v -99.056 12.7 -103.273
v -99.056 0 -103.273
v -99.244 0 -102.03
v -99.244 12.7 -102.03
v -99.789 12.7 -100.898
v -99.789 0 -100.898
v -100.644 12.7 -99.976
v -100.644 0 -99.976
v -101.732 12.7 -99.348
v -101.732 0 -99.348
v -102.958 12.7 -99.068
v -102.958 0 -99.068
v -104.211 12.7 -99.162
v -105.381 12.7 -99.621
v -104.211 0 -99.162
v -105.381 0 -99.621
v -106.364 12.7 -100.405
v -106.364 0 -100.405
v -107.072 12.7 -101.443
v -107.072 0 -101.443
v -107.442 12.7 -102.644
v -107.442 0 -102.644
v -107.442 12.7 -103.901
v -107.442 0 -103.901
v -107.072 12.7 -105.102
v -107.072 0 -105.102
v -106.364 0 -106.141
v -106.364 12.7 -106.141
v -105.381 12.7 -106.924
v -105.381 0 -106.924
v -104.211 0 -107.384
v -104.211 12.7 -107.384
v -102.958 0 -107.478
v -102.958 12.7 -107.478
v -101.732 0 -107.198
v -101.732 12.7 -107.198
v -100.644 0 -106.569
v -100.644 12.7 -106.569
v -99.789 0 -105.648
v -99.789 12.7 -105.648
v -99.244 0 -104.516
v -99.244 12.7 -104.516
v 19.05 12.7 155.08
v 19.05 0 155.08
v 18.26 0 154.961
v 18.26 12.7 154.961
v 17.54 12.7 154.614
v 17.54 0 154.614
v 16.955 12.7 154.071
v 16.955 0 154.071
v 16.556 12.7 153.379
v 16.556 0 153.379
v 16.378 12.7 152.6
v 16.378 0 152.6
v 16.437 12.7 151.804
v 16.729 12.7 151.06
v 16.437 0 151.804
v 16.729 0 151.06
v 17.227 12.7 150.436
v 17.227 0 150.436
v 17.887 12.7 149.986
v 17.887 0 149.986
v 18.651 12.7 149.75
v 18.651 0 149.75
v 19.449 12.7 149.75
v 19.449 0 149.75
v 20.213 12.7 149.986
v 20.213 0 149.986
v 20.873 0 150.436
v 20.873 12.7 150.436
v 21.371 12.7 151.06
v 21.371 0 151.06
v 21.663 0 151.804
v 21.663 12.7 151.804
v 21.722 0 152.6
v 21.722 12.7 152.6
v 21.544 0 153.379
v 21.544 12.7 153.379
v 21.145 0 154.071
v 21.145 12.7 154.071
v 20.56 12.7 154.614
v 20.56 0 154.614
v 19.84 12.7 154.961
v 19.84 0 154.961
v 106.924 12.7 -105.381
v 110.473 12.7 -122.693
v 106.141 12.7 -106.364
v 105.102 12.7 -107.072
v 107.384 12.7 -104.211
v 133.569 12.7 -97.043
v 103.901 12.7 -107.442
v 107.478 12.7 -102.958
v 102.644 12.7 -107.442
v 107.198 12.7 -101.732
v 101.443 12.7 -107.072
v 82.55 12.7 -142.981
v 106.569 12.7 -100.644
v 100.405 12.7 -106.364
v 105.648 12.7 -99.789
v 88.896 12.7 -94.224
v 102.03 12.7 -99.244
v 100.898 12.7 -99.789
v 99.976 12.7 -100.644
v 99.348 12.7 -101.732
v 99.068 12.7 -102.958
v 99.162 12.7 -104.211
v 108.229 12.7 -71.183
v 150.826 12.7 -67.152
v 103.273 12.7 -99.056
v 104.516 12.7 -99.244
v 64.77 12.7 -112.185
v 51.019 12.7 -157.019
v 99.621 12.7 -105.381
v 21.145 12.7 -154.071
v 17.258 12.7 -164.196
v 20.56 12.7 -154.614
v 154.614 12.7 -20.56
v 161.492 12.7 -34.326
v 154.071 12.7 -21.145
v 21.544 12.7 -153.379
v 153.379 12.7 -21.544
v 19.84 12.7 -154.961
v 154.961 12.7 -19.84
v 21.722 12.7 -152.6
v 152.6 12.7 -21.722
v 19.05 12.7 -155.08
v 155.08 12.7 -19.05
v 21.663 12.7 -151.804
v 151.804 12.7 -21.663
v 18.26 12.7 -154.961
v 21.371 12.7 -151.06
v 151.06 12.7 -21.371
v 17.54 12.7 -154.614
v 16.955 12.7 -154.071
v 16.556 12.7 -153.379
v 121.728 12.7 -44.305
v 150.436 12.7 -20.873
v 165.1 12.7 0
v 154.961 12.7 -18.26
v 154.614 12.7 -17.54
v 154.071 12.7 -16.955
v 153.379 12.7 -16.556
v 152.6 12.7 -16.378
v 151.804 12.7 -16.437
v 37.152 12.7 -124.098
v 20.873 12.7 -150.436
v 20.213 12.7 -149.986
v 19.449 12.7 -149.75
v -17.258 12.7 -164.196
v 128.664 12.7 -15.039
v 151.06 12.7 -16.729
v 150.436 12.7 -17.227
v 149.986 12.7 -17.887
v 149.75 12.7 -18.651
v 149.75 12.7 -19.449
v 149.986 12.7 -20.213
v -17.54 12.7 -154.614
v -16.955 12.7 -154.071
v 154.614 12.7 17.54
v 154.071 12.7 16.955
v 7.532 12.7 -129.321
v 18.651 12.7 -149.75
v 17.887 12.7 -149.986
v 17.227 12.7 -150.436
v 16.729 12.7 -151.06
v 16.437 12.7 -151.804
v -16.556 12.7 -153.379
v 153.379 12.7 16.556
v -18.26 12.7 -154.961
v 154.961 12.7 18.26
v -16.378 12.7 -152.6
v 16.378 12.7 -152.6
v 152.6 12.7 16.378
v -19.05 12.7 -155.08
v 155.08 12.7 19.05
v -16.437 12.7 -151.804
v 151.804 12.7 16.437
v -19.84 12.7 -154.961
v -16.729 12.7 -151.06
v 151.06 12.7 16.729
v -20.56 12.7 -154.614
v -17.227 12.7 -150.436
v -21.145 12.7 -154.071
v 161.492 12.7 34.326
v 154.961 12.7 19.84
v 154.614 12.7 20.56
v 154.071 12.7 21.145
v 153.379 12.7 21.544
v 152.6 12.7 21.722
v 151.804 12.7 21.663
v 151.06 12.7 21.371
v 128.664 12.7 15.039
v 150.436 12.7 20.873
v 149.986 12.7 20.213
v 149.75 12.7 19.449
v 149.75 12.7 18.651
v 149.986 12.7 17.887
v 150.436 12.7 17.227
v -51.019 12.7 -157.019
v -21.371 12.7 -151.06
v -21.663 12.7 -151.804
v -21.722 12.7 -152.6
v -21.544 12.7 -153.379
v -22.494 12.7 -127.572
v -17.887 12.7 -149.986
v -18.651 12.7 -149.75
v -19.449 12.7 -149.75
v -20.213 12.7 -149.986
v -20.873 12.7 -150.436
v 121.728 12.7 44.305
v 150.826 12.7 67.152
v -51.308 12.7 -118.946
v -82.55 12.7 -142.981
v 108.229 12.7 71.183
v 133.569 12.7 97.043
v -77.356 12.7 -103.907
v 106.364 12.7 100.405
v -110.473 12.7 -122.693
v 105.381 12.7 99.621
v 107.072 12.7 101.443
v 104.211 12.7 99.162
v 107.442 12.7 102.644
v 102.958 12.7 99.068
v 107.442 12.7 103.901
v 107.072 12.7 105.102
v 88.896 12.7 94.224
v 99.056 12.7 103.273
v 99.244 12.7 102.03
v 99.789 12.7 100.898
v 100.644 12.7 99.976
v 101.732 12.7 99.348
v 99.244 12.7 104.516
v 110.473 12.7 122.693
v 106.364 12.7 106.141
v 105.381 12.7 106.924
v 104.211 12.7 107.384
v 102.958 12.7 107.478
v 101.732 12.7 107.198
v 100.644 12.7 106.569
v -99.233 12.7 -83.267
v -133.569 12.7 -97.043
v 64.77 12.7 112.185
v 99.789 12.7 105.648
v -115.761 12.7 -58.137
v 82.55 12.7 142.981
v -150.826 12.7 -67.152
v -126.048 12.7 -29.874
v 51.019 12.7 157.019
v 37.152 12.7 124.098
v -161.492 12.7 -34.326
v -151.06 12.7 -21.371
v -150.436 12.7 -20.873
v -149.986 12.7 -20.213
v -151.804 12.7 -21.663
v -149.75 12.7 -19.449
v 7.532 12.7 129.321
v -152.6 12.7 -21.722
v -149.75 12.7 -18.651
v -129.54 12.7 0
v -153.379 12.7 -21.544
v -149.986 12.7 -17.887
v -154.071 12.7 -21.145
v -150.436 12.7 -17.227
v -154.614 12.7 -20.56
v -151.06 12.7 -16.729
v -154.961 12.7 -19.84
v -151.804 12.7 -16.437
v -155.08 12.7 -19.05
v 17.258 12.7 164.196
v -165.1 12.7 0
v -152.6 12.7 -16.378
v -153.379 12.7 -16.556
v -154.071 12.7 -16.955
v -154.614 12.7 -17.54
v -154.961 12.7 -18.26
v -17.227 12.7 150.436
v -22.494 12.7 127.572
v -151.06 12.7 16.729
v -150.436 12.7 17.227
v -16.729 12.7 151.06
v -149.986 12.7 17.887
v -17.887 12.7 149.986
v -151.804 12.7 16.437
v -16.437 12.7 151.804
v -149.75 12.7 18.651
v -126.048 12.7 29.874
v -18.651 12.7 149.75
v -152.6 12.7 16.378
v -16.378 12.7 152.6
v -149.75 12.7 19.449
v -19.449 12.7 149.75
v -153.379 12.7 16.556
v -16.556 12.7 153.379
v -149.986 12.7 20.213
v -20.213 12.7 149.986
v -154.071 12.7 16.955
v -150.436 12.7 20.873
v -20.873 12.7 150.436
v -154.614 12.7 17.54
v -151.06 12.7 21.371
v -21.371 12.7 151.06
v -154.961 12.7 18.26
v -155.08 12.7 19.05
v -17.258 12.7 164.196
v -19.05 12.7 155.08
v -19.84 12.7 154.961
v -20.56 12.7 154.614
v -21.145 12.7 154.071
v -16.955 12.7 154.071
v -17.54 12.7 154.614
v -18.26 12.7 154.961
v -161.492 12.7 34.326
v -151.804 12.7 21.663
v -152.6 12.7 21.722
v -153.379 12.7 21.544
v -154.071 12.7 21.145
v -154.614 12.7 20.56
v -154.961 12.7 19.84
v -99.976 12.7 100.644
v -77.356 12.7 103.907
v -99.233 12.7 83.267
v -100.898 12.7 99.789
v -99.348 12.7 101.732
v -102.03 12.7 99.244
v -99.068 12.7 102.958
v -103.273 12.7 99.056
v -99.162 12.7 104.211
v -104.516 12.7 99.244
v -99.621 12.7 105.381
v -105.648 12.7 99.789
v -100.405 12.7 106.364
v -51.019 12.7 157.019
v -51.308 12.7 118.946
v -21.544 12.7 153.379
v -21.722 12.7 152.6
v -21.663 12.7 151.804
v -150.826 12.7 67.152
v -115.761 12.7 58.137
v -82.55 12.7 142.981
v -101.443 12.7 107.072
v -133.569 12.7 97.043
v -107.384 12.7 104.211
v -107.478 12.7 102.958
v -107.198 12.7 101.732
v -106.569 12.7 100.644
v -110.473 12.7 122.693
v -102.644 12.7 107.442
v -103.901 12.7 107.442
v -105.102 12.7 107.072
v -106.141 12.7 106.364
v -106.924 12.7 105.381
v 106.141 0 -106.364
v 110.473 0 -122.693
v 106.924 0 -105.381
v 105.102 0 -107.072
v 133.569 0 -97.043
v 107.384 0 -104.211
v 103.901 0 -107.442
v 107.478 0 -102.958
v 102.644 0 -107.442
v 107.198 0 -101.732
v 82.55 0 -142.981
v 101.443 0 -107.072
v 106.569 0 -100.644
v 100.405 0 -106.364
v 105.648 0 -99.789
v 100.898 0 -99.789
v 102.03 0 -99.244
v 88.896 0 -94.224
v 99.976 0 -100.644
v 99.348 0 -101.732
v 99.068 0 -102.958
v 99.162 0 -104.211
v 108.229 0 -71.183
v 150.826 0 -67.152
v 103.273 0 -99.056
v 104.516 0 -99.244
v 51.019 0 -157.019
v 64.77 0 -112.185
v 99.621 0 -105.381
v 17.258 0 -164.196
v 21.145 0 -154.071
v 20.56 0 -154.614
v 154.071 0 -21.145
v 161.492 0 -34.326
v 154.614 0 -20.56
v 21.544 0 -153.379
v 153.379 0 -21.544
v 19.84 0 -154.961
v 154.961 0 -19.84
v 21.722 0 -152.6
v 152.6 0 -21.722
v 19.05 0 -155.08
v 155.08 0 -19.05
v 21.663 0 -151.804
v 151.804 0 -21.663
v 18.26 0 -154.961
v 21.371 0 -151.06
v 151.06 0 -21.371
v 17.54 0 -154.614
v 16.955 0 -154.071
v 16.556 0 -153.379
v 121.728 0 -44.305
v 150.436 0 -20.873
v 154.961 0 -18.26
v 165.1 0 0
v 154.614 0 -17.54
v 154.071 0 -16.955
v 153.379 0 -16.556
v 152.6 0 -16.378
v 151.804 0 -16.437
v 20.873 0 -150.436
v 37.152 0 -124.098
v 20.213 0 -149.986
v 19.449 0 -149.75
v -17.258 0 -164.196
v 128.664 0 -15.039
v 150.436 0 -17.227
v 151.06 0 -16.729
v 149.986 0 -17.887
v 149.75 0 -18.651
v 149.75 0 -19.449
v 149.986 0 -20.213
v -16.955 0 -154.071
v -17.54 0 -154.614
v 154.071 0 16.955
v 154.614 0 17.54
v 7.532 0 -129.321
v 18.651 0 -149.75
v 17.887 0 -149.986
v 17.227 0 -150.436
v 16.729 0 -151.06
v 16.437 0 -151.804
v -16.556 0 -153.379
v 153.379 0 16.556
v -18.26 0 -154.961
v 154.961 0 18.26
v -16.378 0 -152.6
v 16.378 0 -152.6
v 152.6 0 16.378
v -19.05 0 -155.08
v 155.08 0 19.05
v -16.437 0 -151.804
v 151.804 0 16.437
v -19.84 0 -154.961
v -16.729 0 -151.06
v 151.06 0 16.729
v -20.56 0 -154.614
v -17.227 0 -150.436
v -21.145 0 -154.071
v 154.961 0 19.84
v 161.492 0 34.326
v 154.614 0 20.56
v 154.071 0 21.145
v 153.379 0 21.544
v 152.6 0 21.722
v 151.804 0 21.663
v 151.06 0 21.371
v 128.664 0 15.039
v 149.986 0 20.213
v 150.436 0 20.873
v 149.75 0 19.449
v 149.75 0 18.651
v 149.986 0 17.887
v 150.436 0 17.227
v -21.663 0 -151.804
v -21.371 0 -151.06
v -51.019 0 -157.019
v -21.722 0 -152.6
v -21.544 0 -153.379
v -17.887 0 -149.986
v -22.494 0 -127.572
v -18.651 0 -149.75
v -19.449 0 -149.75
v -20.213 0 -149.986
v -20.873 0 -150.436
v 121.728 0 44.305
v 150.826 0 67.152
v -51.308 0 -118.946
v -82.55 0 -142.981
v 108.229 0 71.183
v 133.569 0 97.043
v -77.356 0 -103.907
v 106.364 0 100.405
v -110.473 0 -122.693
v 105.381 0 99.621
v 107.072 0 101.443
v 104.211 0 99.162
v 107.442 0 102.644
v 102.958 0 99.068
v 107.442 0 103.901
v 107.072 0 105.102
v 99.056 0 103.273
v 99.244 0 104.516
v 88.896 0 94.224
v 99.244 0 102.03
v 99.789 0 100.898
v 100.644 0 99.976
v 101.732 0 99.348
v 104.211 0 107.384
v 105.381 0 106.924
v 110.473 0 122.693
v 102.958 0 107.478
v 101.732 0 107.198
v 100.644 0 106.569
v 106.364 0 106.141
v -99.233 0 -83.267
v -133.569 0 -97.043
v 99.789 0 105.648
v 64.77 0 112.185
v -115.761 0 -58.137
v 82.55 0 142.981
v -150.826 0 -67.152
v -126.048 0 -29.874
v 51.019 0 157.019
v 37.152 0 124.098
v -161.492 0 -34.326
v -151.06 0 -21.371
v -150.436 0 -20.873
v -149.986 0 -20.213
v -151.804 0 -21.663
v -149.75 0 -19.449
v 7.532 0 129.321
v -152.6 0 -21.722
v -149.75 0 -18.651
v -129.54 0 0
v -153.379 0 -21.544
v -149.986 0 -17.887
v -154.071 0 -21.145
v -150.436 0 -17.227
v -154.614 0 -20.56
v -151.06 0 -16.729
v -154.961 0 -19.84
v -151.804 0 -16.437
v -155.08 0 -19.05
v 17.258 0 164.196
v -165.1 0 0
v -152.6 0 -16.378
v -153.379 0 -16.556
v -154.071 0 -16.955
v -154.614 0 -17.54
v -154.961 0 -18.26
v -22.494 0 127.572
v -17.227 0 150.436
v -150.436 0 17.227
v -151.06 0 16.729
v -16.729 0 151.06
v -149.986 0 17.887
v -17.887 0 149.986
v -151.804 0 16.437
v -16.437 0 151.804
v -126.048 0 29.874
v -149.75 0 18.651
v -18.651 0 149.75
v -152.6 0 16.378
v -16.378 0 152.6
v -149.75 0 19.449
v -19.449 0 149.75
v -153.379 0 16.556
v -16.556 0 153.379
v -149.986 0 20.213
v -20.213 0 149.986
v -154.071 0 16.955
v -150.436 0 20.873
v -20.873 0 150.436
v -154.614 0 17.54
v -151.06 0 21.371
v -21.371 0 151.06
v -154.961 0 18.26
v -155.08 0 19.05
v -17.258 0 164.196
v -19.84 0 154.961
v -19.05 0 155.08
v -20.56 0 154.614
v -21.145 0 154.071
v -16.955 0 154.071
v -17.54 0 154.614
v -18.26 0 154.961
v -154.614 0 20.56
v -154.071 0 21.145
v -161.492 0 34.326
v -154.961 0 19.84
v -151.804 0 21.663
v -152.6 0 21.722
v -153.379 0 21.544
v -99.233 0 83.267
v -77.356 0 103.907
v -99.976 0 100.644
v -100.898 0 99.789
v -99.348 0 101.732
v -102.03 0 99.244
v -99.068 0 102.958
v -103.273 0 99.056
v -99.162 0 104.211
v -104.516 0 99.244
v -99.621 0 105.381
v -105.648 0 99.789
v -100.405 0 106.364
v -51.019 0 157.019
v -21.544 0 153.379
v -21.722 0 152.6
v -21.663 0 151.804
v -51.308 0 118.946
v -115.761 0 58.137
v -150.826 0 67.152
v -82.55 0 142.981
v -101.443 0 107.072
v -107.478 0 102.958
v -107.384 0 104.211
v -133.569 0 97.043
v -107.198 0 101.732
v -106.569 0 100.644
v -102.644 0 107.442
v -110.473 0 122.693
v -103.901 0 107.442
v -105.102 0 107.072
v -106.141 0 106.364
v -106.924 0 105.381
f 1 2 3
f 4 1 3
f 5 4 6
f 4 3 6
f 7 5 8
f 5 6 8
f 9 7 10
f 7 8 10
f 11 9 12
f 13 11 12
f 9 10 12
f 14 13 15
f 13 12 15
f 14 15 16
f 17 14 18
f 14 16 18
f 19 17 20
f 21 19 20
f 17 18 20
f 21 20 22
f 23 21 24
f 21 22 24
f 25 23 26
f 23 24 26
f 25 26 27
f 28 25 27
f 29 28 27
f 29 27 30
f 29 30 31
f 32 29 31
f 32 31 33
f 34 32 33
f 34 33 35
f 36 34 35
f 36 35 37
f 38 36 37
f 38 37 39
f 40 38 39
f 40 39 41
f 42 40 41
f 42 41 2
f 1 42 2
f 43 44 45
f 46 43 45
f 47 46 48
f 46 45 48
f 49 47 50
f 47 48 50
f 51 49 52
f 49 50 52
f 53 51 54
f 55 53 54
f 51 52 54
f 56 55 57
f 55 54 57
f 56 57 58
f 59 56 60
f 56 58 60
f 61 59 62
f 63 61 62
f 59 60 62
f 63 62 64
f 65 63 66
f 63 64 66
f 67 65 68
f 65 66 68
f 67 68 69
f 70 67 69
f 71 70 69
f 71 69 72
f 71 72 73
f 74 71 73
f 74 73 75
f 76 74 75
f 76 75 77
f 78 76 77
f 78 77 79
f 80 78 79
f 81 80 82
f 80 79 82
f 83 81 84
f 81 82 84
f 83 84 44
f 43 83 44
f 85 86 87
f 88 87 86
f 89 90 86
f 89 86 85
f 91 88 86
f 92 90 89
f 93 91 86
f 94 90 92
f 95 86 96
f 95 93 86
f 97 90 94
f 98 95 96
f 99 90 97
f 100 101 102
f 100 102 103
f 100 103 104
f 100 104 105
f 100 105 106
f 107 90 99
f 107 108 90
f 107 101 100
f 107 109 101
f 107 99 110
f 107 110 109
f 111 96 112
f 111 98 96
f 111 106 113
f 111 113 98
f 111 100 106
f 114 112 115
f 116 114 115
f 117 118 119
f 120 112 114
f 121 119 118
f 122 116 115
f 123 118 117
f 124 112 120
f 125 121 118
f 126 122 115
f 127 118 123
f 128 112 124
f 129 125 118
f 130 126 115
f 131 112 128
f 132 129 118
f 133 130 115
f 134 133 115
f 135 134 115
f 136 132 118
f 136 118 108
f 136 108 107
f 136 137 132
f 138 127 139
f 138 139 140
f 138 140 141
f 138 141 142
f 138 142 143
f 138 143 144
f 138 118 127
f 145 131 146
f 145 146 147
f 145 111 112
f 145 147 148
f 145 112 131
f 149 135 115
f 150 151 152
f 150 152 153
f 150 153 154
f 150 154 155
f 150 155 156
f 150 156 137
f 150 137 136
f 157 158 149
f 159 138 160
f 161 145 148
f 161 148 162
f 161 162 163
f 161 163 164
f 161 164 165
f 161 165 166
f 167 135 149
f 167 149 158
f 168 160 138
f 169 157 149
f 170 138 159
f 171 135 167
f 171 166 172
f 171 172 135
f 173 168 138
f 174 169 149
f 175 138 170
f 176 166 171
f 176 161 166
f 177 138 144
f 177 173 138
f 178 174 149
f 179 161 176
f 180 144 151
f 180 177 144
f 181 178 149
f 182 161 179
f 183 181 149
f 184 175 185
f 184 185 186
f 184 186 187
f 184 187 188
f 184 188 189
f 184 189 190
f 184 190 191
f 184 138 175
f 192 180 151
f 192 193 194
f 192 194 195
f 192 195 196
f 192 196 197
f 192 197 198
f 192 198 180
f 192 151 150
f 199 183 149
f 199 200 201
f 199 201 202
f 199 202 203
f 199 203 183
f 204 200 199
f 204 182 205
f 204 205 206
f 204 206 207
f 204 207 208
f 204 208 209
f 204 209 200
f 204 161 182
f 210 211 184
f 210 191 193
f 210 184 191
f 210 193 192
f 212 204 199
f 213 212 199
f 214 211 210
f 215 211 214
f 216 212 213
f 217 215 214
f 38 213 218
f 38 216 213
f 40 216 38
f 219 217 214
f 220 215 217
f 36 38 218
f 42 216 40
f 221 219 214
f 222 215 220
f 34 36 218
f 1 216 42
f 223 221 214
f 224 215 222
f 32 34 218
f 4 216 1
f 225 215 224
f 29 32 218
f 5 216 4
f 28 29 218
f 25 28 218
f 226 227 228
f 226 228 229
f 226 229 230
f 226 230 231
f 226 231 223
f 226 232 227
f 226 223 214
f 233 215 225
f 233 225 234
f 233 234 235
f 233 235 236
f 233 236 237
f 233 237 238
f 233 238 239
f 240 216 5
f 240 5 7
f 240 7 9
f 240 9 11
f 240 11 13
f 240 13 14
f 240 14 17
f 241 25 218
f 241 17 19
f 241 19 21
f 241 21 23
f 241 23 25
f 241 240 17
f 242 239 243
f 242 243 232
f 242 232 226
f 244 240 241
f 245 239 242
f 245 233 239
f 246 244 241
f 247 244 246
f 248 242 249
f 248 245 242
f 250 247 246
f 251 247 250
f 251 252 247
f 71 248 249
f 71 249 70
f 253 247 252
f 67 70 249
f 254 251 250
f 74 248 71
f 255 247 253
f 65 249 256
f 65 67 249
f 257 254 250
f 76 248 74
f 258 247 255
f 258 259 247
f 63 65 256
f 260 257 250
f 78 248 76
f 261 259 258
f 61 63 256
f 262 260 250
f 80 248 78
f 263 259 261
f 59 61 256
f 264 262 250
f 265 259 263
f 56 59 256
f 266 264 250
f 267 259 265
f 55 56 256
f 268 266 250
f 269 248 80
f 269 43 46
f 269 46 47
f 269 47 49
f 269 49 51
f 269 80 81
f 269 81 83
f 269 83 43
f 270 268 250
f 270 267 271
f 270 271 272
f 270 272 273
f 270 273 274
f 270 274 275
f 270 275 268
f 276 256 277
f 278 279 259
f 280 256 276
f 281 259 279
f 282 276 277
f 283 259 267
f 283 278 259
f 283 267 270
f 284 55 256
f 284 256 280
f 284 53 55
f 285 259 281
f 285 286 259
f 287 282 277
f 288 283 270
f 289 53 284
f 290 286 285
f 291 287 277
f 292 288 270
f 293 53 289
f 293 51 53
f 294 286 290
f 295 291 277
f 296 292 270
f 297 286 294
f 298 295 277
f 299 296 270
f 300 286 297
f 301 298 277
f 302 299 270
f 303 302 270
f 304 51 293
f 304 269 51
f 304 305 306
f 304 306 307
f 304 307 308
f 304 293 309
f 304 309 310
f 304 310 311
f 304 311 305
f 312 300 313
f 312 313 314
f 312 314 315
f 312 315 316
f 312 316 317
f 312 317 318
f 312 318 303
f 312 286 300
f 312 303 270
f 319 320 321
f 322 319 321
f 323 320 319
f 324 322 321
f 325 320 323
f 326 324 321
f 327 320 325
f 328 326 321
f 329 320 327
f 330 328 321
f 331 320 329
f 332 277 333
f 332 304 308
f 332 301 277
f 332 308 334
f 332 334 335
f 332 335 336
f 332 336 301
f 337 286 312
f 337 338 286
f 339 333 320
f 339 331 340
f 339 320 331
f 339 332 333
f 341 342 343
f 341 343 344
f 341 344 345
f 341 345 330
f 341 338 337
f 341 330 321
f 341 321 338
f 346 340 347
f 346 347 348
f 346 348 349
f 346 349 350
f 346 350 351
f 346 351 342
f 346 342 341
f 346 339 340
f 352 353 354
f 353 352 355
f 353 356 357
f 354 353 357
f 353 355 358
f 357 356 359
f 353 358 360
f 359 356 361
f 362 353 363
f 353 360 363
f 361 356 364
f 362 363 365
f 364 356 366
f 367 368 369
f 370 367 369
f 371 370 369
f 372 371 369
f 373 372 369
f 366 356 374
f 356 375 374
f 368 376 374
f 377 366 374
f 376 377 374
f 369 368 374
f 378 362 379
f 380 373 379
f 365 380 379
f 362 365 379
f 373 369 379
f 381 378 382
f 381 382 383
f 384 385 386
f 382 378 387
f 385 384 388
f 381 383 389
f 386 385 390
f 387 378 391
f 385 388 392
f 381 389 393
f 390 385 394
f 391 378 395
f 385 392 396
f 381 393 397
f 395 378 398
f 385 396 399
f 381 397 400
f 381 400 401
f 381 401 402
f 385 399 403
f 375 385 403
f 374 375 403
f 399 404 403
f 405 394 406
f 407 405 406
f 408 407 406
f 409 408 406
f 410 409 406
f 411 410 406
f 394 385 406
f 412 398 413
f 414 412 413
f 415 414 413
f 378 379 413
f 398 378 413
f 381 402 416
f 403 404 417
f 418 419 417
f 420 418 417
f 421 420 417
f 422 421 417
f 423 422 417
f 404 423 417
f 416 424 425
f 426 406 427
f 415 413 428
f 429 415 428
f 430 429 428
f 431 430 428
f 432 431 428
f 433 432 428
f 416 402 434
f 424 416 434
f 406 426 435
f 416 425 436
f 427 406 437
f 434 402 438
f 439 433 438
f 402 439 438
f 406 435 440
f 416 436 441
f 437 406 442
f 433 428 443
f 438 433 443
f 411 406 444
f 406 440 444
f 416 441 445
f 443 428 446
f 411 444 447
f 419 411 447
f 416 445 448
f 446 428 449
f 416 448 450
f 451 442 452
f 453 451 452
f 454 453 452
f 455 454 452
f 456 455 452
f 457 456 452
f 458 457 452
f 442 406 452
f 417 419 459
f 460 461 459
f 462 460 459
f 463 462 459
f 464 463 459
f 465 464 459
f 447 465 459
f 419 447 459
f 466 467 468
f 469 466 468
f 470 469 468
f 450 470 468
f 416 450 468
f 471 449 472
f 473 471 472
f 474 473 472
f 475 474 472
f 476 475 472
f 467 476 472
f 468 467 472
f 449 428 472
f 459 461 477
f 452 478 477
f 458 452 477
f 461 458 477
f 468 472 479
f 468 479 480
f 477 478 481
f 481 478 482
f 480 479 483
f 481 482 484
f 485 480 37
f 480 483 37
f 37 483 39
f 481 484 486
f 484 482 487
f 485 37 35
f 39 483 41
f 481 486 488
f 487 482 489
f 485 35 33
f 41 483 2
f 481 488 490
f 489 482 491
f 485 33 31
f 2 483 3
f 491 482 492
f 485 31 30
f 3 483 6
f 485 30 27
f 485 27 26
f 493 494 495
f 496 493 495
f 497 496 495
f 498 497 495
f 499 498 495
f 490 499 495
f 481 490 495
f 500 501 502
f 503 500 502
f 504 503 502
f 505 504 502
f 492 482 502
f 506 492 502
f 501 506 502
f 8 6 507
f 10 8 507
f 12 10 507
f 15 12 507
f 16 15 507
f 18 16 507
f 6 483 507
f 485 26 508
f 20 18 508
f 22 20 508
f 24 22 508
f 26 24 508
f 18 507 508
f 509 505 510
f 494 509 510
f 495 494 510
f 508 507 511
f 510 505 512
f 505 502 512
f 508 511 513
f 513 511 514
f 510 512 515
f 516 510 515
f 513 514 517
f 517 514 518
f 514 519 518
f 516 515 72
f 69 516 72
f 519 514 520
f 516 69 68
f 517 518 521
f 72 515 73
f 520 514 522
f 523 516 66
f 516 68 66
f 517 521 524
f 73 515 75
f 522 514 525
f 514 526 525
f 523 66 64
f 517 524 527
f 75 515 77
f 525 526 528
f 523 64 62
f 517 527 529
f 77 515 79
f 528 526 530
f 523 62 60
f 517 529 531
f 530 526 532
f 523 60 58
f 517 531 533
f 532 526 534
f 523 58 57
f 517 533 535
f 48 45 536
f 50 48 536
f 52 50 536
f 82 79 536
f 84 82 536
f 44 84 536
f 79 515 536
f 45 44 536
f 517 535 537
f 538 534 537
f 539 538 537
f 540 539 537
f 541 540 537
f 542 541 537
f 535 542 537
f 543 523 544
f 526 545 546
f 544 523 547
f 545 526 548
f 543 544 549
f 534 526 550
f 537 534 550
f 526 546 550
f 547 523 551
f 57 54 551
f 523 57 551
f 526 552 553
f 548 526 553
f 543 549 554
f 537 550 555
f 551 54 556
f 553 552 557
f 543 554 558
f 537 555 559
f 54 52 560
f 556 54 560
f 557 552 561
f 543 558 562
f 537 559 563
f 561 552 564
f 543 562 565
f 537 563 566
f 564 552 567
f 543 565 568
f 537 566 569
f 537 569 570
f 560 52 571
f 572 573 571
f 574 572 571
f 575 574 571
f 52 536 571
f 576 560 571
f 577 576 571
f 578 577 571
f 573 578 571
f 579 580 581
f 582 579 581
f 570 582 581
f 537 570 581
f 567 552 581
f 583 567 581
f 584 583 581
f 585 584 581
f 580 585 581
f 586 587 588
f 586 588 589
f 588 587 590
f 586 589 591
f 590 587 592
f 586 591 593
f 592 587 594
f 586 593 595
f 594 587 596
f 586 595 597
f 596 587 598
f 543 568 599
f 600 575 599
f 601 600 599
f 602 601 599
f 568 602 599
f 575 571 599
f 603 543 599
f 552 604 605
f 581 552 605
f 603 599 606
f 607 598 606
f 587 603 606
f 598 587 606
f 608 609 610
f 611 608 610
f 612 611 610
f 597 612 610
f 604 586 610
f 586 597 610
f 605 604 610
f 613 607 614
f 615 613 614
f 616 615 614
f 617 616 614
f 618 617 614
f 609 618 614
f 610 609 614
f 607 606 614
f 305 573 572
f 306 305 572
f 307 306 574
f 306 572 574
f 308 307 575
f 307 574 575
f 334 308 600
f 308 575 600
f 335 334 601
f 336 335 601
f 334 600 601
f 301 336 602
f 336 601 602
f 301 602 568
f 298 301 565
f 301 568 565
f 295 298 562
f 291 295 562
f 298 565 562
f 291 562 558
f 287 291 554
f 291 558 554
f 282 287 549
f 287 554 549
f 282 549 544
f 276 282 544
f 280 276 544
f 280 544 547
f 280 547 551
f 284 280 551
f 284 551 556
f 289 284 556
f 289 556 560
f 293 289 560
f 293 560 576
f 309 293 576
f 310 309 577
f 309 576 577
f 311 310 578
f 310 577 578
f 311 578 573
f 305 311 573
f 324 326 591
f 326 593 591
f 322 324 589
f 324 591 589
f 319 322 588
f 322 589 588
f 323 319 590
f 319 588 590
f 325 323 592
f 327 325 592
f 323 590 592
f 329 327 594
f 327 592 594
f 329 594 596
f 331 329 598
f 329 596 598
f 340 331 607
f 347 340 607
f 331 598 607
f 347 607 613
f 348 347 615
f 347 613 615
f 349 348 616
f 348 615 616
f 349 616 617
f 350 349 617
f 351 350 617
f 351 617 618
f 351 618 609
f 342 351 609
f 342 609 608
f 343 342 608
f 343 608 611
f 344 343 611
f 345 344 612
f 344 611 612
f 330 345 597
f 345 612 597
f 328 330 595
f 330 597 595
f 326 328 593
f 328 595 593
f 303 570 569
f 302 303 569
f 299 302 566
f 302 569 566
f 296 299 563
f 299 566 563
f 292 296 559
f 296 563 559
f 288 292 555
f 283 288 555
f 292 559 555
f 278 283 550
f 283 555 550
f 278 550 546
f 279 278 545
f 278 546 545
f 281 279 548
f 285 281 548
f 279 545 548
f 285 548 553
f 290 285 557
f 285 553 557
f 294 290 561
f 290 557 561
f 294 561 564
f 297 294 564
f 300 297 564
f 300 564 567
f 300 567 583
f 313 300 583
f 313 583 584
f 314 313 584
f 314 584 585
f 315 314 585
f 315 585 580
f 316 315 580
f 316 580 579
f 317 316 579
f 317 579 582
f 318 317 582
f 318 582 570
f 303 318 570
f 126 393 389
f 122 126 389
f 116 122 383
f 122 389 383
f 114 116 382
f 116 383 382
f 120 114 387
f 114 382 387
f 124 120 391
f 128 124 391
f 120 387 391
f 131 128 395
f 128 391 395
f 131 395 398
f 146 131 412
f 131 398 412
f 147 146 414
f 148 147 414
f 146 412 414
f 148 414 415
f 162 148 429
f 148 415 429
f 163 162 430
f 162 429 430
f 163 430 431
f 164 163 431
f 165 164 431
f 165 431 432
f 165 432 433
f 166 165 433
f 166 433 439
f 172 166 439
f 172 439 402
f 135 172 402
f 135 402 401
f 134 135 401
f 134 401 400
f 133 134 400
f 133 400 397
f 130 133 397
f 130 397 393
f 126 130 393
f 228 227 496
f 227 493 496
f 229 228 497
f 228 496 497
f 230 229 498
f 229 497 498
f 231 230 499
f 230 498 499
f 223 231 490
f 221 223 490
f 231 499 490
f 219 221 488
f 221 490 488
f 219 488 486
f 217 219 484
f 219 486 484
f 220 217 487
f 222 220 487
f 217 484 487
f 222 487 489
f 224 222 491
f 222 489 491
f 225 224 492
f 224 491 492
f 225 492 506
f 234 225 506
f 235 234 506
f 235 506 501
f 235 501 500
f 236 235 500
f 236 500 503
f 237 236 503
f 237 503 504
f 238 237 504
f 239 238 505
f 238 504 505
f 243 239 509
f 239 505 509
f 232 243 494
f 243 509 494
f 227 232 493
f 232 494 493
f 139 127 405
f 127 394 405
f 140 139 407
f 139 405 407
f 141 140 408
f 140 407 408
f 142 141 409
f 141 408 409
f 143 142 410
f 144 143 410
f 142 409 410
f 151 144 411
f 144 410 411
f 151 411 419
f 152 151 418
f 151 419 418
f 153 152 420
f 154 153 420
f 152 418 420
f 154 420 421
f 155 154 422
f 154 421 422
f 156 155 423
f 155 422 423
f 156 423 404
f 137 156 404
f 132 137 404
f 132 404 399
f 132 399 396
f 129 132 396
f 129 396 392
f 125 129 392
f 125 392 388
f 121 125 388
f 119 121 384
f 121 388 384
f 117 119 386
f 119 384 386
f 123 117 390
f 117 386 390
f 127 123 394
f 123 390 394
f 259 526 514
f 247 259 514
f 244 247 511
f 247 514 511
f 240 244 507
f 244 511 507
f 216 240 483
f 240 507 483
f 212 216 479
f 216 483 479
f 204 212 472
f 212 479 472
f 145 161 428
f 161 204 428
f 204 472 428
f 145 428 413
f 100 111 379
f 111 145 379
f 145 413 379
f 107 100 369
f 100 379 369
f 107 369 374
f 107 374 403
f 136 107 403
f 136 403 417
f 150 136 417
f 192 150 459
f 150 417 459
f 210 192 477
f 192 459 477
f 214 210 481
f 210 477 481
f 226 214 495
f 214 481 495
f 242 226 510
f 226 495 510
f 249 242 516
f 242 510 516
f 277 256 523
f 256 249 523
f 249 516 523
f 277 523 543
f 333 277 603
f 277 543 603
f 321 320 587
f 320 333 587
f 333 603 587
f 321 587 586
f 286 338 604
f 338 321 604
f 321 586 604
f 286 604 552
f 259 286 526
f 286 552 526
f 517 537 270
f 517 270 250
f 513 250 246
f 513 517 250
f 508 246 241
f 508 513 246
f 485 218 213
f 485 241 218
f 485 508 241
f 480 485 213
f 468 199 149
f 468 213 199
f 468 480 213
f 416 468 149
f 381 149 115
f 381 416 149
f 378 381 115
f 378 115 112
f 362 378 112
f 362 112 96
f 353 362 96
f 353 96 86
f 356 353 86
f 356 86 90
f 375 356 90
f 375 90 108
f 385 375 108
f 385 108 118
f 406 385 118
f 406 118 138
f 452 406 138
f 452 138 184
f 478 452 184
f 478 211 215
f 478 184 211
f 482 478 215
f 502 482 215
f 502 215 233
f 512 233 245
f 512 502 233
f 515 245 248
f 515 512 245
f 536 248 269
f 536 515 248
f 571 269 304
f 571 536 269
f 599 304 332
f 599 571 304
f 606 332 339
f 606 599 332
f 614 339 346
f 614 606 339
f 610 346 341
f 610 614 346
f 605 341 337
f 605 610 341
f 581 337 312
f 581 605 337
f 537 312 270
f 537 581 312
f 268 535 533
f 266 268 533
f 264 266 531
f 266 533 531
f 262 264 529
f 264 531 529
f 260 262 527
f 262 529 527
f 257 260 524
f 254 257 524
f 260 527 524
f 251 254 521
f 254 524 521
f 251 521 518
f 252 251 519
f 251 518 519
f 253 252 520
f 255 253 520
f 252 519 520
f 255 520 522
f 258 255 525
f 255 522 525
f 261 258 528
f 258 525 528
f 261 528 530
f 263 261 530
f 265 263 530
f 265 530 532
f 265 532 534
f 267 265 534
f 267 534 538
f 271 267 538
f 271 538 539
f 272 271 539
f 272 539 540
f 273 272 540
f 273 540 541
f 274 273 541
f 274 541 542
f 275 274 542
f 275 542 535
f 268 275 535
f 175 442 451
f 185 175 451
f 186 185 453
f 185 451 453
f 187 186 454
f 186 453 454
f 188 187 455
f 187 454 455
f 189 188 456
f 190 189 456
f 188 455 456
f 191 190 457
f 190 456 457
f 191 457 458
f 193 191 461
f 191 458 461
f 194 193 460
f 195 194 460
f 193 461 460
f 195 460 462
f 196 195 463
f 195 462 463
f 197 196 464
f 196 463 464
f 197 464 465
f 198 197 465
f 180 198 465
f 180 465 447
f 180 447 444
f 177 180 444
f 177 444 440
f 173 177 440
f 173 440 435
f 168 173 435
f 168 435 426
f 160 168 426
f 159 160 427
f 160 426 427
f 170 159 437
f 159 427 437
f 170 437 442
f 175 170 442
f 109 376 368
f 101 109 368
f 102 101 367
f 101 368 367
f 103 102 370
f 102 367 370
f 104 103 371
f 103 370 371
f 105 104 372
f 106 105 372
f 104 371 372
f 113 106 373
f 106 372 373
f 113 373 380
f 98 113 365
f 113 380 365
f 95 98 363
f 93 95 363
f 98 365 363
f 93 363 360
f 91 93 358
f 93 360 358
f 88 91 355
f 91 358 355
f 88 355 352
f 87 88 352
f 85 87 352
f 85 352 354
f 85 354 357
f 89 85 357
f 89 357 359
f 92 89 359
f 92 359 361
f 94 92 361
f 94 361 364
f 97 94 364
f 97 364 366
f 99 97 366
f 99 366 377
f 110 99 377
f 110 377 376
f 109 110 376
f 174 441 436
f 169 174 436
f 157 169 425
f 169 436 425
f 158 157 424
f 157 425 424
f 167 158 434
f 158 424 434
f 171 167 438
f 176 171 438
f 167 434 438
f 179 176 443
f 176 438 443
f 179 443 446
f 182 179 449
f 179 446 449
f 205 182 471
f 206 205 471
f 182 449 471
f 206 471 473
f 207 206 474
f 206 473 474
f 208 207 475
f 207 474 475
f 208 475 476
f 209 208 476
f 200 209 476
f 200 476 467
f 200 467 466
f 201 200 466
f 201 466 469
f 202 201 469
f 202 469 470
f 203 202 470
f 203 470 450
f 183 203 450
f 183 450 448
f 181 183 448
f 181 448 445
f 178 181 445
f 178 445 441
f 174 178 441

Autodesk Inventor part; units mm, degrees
ref_plane "YZ Plane" through (0, 0, 0) normal (1, 0, 0) x (0, 1, 0)
ref_plane "XZ Plane" through (0, 0, 0) normal (0, 1, 0) x (-1, 0, 0)
ref_plane "XY Plane" through (0, 0, 0) normal (0, 0, 1) x (1, 0, 0)
sketch "Sketch1" plane through (0, 0, 0) normal (0, 1, 0) x (-1, 0, 0)
  circle A0 centre (0, 0) radius 165.1
  circle A1 centre (0, 0) radius 129.54
  dimension "d0" = 330.2
  dimension "d1" = 259.08
extrude "Extrusion1" add sketch "Sketch1" along normal blind 12.7
sketch "Sketch2" plane through (0, 12.7, 0) normal (0, 1, 0) x (1, 0, 0)
  circle A0 centre (19.05, -152.4) radius 4.7802
  line L0 (0, 0) -> (0, -55.3703) construction
  circle A1 centre (-19.05, -152.4) radius 4.7802
  dimension "d6" = 152.4
  dimension "d7" = 19.05
hole "Hole1" at (19.05, 12.7, 152.4) at (-19.05, 12.7, 152.4) direction (0, -1, 0) diameter 5.3594 end through all thread size "1/4-28 UNF" class "2B" standard "ANSI Unified Screw Threads"
pattern_circular "Circular Pattern1" count 4 over 360 about axis through (0, -10, 0) along (0, 1, 0) of "Hole1"
sketch "Sketch3" plane through (0, 12.7, 0) normal (0, 1, 0) x (1, 0, 0)
  line L0 (0, 0) -> (103.2729, 103.2729) construction
  line L1 (0, 0) -> (146.05, 0) construction
  circle A0 centre (103.2729, 103.2729) radius 4.2786
  dimension "d18" = 146.05
  dimension "d19" = 45
hole "Hole2" at (103.2729, 12.7, -103.2729) direction (0, -1, 0) diameter 8.4328 end through all clearance for "Flat Head Machine Screw (82)" size "5/16" standard "Ansi Unified Screw Threads"
pattern_circular "Circular Pattern2" count 4 over 360 about axis through (0, 0, 0) along (0, 1, 0) of "Hole2"
properties part number "fixedRing"
